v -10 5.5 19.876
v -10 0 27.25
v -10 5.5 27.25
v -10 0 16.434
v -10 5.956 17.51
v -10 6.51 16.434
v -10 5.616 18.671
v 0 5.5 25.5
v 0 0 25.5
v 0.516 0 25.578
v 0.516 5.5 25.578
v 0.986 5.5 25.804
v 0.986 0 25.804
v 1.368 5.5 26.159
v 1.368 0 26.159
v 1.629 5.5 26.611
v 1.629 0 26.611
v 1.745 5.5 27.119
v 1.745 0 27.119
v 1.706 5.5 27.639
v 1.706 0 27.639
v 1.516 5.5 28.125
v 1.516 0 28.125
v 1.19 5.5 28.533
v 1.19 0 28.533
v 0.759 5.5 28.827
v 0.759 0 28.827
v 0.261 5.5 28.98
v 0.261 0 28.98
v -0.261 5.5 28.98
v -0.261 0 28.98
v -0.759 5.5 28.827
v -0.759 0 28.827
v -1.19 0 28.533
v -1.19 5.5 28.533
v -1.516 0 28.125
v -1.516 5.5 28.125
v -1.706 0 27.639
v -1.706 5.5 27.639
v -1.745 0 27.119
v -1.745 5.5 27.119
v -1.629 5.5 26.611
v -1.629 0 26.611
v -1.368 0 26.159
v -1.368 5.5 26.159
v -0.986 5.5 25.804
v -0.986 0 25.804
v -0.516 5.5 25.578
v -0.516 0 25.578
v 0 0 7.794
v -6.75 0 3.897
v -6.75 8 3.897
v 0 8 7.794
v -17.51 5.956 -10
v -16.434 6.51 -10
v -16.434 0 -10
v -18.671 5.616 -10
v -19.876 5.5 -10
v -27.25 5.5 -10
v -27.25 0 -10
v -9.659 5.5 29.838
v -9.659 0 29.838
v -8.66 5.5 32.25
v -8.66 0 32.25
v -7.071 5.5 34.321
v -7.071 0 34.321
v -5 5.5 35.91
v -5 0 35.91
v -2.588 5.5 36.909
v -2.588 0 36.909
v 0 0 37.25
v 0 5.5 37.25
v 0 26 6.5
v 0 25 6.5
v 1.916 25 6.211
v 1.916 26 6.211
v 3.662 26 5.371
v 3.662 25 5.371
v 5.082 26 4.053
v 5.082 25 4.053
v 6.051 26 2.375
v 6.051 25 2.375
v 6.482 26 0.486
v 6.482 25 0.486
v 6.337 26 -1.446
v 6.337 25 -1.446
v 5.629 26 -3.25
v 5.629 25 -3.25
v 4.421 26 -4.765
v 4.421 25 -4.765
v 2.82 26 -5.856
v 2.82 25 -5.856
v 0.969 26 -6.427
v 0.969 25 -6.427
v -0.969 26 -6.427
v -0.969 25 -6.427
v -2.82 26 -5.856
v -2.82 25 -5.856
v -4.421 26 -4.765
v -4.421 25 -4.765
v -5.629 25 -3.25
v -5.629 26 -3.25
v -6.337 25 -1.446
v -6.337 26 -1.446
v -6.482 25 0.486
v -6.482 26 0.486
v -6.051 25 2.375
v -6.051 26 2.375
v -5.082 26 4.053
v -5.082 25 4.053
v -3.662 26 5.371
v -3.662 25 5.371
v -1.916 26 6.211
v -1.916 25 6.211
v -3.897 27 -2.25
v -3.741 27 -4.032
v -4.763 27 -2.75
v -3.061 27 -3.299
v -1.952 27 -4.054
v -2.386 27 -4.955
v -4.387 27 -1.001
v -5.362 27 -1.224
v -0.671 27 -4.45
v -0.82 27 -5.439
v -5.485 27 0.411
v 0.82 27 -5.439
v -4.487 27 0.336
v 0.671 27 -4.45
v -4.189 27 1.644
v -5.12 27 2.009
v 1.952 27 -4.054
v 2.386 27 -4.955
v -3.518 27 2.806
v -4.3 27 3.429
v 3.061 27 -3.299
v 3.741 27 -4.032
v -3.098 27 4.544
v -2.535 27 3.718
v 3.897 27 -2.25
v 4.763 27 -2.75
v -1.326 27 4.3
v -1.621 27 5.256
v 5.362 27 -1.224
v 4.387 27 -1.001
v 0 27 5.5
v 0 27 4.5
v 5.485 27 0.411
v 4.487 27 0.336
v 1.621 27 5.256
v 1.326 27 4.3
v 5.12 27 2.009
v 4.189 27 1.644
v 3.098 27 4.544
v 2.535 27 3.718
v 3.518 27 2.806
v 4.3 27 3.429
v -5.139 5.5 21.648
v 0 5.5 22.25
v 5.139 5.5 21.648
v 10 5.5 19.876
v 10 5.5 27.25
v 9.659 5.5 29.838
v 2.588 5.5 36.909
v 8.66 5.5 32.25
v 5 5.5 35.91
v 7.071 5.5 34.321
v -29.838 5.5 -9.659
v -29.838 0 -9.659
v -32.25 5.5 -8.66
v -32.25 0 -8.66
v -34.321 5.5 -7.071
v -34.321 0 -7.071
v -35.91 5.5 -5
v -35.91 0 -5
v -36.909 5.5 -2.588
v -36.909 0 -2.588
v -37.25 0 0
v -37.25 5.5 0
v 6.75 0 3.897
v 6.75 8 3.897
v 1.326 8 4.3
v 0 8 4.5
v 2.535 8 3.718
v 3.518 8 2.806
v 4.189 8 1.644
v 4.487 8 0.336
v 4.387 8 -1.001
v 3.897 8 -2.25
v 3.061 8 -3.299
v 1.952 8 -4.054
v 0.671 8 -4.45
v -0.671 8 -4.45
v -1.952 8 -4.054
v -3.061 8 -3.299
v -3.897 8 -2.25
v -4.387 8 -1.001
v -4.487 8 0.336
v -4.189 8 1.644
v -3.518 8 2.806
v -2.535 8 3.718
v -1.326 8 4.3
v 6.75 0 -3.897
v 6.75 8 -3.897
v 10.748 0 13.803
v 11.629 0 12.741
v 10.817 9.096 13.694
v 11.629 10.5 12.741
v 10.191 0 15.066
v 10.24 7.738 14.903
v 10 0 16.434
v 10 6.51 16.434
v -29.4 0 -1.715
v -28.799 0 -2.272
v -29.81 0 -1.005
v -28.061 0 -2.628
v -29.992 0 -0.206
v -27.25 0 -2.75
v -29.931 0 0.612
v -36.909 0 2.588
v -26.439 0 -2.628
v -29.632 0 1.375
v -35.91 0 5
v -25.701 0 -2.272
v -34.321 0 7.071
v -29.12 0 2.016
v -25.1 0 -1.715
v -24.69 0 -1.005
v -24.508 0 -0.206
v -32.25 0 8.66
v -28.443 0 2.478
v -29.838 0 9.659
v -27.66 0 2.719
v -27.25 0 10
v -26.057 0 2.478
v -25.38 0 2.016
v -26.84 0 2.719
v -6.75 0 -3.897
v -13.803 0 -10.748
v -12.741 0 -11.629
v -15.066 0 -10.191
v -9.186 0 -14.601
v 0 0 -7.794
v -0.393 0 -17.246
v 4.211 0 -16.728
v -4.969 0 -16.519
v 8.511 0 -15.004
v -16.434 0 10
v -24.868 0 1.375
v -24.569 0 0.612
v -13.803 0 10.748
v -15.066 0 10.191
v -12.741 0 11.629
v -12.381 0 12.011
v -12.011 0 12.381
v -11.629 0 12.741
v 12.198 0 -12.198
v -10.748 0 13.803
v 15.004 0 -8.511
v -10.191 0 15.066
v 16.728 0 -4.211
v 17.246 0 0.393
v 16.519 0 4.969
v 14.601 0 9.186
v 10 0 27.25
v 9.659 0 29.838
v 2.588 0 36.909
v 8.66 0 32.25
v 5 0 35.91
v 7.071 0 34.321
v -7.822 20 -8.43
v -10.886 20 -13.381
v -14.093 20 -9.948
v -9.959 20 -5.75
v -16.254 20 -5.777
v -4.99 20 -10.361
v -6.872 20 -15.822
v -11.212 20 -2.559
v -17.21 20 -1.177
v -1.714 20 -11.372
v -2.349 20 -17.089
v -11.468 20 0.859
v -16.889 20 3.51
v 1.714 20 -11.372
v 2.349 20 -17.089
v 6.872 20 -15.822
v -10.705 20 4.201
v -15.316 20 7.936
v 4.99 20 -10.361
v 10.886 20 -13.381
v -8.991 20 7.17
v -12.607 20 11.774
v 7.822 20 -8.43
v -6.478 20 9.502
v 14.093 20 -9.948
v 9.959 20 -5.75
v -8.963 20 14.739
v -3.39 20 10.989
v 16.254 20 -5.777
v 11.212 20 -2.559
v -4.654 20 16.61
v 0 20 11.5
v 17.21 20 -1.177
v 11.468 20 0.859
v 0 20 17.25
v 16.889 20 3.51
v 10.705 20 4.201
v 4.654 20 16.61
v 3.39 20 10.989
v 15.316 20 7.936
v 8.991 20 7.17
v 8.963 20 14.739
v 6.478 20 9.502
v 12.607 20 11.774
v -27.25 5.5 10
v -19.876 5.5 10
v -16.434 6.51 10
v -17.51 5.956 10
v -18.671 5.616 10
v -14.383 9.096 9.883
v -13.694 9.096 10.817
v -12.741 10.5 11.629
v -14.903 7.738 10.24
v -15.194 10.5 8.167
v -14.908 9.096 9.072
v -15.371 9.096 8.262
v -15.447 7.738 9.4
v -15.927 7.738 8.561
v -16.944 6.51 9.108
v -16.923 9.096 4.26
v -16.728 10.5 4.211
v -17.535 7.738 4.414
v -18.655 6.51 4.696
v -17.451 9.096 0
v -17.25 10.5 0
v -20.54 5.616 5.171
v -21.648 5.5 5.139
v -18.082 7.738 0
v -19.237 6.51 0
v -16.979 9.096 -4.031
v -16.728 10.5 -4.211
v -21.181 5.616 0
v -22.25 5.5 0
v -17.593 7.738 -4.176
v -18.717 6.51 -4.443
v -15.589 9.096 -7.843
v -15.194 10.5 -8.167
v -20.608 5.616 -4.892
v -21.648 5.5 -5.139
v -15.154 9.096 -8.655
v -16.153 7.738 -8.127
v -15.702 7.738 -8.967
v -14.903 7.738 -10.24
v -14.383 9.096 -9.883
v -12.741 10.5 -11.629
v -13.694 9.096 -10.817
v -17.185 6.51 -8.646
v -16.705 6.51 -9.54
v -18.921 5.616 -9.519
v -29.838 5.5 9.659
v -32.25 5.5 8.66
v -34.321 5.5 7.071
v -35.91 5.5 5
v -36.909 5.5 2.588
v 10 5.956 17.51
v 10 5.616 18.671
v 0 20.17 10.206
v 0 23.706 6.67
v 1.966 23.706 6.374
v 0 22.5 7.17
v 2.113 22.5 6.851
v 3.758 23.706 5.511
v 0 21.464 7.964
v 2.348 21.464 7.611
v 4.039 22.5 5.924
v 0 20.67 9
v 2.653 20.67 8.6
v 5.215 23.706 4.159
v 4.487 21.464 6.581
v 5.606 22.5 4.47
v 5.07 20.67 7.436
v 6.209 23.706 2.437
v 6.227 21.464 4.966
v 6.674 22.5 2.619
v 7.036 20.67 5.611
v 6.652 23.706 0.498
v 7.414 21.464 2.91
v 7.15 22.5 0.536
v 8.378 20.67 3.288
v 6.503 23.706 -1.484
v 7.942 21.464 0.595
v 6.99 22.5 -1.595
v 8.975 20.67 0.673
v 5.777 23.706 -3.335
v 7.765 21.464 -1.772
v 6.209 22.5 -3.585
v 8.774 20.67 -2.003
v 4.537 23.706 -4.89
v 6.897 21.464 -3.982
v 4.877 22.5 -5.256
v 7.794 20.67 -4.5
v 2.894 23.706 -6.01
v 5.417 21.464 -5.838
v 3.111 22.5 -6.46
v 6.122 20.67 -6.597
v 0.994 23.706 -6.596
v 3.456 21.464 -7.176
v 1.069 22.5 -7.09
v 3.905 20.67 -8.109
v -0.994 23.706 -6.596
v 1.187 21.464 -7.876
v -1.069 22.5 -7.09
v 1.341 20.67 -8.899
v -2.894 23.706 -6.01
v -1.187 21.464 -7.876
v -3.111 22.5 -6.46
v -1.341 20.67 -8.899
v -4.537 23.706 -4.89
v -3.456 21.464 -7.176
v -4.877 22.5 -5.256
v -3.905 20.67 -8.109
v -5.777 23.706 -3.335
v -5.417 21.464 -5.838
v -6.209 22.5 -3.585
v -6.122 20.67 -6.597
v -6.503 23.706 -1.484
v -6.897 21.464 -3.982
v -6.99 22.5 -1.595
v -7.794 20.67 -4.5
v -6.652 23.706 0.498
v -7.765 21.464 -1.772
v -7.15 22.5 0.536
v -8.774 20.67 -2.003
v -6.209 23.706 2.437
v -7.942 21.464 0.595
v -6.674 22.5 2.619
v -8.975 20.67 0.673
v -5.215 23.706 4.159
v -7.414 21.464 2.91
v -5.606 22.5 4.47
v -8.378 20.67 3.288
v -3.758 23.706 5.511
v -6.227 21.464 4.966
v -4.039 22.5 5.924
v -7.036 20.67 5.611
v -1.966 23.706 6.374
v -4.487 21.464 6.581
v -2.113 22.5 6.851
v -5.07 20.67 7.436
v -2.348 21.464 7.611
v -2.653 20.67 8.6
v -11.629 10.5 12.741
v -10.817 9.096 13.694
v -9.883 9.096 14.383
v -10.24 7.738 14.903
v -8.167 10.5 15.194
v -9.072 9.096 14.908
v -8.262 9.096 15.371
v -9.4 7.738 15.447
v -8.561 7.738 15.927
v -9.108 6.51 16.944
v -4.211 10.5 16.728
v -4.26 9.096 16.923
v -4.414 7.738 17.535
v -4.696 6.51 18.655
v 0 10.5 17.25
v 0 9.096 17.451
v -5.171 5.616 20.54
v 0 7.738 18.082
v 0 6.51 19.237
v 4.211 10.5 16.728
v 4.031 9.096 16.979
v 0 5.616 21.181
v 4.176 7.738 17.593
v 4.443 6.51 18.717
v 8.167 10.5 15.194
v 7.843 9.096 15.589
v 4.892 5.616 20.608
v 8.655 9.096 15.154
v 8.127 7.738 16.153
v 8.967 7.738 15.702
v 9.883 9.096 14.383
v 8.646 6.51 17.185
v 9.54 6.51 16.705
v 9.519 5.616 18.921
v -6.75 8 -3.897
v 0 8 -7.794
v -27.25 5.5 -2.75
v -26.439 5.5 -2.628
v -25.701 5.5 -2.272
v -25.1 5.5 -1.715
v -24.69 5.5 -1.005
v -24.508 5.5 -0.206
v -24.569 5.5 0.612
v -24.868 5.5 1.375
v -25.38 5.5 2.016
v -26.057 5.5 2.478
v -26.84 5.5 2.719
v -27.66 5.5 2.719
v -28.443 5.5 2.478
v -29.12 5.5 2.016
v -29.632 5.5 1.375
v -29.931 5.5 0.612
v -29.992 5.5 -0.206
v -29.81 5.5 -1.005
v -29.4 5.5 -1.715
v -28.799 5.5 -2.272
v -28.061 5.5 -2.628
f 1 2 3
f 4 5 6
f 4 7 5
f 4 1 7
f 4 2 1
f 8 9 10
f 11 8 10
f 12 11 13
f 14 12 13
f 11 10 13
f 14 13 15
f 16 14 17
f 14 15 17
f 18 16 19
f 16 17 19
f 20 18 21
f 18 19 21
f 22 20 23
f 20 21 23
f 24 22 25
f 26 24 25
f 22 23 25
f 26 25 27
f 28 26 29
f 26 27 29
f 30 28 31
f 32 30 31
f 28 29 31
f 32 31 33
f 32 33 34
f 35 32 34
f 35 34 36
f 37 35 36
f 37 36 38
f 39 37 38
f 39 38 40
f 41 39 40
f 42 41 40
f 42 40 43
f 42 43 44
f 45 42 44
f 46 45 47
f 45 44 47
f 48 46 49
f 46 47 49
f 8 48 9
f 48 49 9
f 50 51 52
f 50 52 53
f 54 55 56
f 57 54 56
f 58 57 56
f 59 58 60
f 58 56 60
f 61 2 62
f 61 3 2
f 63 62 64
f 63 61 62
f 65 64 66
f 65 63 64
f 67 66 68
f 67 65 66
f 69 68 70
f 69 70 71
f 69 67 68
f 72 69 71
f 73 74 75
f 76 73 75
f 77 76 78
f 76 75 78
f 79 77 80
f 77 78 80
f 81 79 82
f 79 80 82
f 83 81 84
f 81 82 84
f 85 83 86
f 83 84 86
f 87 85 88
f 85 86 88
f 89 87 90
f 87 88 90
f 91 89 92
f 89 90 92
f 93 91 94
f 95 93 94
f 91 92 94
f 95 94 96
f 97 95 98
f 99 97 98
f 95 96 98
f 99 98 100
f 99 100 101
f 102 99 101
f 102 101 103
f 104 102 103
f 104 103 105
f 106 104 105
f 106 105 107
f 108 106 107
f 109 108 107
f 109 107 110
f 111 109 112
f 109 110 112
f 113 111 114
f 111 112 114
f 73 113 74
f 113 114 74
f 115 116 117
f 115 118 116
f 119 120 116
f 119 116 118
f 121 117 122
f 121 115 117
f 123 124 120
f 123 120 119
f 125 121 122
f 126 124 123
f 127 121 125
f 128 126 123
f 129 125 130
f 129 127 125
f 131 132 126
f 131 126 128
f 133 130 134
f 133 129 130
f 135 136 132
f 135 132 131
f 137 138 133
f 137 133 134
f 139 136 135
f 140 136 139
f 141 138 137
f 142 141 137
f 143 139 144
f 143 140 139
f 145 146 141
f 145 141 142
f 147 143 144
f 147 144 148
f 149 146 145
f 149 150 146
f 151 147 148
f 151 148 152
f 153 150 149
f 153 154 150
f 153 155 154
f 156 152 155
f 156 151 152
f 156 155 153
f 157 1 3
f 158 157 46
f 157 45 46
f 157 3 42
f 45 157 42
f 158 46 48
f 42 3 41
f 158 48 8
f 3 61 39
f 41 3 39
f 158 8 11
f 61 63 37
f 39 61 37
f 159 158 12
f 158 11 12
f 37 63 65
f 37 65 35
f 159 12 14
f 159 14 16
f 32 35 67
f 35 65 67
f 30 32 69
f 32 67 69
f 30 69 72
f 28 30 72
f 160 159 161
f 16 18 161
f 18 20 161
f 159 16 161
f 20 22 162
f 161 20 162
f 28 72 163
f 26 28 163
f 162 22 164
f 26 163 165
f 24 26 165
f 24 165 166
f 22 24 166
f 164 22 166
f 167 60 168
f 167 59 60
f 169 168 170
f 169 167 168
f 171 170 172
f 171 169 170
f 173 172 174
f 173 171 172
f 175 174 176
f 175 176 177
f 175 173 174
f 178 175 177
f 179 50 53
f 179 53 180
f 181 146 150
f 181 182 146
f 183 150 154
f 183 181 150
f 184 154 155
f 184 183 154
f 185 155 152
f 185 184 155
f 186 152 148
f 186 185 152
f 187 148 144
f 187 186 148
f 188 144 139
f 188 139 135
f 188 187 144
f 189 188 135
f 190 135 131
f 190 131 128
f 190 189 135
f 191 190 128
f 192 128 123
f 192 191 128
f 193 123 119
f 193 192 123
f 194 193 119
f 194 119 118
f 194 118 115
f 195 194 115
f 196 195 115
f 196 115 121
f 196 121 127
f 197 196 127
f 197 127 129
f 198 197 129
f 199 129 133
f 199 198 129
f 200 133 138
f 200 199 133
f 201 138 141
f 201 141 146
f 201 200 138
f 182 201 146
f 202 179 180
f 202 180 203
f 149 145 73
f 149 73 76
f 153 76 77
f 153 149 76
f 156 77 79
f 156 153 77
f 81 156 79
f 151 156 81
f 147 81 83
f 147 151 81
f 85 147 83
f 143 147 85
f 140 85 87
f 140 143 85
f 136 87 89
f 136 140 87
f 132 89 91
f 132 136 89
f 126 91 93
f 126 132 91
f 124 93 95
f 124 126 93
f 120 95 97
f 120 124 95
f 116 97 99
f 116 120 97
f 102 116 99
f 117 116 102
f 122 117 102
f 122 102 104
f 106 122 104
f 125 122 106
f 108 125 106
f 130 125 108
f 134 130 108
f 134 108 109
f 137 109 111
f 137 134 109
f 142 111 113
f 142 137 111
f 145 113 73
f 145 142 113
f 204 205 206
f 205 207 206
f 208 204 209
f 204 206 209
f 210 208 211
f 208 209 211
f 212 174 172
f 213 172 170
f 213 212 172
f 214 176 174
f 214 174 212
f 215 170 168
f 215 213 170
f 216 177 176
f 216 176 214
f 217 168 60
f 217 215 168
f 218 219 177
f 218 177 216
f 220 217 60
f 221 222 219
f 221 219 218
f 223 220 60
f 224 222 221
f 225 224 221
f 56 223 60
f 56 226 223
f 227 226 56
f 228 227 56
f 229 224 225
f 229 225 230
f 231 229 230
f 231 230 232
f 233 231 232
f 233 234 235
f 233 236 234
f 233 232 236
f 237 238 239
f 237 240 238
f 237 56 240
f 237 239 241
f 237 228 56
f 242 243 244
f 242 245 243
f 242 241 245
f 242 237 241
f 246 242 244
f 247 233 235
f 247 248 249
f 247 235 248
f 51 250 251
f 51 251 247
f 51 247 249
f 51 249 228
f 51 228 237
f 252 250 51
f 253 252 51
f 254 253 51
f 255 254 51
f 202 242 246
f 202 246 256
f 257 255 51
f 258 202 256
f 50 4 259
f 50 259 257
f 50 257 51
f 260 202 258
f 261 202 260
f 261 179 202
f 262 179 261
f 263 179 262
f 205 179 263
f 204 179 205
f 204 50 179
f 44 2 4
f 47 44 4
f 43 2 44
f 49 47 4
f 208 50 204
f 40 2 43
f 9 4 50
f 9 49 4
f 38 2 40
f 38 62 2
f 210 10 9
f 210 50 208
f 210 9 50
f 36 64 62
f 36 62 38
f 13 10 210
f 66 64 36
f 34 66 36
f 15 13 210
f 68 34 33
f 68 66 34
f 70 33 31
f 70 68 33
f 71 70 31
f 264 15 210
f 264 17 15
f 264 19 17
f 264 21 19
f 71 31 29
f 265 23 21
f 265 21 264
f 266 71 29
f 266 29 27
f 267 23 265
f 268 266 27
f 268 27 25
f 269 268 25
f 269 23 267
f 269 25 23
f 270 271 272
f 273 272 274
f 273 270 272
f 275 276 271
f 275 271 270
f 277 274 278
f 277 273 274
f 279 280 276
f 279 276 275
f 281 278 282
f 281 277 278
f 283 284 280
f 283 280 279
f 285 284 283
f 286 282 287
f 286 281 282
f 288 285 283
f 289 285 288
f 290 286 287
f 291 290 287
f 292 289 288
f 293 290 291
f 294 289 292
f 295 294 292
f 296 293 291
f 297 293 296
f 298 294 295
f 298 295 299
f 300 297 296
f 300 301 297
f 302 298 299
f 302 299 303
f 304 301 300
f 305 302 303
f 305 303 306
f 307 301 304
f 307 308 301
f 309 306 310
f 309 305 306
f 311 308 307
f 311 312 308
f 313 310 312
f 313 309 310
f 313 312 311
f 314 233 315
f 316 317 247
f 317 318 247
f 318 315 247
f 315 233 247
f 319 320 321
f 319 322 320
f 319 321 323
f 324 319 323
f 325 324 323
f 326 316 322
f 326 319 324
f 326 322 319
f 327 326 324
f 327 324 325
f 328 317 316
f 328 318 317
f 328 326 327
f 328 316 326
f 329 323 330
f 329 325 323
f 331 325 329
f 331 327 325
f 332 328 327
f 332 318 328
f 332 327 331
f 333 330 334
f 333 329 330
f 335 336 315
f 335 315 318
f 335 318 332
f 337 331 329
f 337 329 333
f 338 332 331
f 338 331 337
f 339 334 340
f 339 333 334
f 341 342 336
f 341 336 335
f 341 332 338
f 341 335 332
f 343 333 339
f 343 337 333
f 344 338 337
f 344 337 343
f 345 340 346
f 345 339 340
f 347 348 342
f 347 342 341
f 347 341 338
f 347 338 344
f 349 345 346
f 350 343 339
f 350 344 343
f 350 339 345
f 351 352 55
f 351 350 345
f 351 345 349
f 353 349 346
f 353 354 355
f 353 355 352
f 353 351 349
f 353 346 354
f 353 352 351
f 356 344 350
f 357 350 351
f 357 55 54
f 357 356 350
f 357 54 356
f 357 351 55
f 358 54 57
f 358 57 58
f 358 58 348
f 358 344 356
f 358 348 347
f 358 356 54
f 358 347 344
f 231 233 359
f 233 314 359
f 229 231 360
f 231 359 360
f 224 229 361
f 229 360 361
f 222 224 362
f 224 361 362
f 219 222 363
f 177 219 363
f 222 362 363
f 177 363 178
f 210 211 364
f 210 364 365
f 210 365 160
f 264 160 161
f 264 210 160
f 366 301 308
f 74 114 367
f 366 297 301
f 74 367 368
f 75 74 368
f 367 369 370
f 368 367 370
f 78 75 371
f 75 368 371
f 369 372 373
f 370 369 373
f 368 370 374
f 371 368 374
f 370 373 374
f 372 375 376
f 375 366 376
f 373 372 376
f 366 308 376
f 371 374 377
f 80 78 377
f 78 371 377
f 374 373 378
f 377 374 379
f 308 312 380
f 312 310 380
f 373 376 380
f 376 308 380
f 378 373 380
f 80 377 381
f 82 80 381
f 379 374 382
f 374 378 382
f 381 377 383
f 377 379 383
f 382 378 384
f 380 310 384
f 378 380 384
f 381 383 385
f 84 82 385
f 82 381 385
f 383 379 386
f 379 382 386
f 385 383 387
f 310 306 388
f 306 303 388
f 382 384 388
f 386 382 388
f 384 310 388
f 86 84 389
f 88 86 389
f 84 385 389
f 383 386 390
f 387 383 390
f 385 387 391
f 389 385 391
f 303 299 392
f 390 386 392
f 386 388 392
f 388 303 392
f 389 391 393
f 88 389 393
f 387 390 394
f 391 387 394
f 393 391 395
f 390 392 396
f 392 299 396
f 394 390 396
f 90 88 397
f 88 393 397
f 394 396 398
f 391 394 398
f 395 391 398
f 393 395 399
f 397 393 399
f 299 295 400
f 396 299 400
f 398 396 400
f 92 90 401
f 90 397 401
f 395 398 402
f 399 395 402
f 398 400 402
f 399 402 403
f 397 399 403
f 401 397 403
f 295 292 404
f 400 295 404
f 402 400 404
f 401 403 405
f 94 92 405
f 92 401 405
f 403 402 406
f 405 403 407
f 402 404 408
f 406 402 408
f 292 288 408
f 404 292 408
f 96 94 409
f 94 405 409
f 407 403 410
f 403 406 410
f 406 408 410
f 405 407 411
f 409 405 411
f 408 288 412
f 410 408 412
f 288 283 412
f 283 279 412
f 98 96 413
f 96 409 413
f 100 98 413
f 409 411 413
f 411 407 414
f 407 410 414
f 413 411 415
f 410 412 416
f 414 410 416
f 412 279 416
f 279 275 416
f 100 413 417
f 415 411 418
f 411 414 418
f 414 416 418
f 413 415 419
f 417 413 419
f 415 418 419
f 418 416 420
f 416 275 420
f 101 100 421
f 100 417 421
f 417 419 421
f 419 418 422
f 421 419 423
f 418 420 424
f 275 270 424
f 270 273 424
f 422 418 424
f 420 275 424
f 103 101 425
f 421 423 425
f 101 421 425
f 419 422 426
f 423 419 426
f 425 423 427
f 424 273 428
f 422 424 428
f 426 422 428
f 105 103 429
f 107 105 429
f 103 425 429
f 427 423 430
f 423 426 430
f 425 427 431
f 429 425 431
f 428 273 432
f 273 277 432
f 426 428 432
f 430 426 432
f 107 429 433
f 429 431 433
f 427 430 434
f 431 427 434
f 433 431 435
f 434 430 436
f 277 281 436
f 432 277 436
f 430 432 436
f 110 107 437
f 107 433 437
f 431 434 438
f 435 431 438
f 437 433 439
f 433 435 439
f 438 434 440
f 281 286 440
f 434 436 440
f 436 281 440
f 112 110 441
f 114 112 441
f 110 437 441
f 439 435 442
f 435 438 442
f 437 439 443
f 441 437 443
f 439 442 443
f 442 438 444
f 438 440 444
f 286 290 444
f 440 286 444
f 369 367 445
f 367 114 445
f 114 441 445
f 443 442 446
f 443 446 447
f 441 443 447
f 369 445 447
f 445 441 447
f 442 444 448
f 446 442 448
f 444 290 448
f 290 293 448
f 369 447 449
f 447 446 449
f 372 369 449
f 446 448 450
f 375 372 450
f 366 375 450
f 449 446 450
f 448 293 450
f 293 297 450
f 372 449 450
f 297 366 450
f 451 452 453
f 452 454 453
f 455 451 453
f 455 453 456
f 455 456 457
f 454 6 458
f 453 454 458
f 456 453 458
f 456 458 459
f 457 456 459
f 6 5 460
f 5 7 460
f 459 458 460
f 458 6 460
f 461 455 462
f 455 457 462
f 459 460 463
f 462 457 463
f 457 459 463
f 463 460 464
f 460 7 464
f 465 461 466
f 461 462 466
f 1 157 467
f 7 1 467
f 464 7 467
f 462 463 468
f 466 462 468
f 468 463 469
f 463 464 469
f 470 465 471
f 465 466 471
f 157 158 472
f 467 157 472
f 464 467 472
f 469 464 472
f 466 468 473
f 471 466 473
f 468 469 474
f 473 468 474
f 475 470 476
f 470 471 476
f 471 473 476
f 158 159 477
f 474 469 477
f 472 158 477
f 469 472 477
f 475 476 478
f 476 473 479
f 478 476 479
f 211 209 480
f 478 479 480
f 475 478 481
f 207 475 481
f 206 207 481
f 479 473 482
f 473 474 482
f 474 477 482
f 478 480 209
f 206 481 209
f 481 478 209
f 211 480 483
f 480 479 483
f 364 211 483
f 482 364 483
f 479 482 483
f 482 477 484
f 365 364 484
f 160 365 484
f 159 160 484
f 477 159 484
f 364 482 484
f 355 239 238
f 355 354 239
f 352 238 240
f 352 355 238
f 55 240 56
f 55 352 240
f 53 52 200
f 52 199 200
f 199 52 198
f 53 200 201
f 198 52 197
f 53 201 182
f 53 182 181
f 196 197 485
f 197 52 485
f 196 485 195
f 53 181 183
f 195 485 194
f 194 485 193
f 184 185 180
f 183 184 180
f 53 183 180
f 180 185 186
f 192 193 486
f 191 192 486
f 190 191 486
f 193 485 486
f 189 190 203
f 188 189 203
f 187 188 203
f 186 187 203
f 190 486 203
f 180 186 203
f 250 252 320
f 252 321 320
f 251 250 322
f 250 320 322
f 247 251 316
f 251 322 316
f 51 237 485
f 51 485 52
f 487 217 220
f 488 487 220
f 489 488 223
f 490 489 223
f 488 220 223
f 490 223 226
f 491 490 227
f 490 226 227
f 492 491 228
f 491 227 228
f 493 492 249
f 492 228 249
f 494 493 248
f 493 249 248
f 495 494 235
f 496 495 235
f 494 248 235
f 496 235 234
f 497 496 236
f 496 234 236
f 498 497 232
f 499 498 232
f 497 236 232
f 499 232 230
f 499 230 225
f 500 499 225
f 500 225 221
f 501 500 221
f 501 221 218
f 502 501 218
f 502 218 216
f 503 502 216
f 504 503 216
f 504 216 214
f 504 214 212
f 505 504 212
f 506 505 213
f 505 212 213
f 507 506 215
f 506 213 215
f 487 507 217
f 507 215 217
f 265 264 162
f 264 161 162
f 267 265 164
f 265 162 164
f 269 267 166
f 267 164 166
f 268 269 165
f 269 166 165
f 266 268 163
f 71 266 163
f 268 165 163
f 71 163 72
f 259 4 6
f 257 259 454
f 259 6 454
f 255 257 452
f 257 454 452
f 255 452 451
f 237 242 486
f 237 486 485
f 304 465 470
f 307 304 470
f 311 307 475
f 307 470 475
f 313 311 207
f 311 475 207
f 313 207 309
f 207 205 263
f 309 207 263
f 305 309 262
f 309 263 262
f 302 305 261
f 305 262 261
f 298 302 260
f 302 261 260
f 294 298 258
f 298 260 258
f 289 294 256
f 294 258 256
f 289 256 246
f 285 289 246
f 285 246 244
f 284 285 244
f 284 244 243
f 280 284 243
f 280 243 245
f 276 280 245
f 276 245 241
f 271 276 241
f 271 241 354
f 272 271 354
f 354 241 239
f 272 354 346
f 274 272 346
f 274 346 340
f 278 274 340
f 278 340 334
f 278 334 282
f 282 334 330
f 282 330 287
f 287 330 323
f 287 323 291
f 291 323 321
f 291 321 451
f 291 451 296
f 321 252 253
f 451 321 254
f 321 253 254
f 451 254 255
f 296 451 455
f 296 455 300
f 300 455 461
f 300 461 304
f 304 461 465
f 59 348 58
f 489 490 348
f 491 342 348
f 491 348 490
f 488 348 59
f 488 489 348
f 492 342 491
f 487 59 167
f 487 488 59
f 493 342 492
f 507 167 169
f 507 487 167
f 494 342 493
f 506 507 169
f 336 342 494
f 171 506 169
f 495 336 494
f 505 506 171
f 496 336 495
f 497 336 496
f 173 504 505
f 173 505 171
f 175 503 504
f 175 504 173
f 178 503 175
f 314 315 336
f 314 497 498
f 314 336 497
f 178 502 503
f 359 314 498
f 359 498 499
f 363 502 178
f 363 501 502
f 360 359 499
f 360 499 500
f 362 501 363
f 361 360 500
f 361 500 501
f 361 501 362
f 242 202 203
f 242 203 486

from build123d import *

# Parameters (mm, degrees)
ESBO_O1_R                = 17.25
ESBO_O1_R_2              = 4.5
RESSALTO_EXTRUS_O1_DEPTH = 20
CORTE_EXTRUS_O1_DEPTH    = 8
ESBO_O5_R                = 2.75
ESBO_O5_R_2              = 1.75
RESSALTO_EXTRUS_O2_DEPTH = 5.5
FILETE1_R                = 5
FILETE2_R                = 10
ESBO_O7_R                = 6.5
ESBO_O7_R_2              = 4.5
RESSALTO_EXTRUS_O3_DEPTH = 7
FILETE3_R                = 5
CHANFRO1_SIZE            = 1


with BuildPart() as part:
    # Esboço1 → Ressalto-extrusão1 (new body)
    with BuildSketch(Plane(origin=(0, 0, 0), x_dir=(1, 0, 0), z_dir=(0, 1, 0))):
        with Locations(Location((0, 0, 0), (0, 0, 270))):
            Circle(ESBO_O1_R)
        with Locations(Location((0, 0, 0), (0, 0, 270))):
            Circle(ESBO_O1_R_2, mode=Mode.SUBTRACT)
    extrude(amount=RESSALTO_EXTRUS_O1_DEPTH)

    # Esboço1<3> → Corte-extrusão1 (cut)
    with BuildSketch(Plane(origin=(0, 0, 0), x_dir=(1, 0, 0), z_dir=(0, 1, 0))):
        Polygon((-6.75, 3.897114317), (-6.75, -3.897114317), (0, -7.794228634), (6.75, -3.897114317), (6.75, 3.897114317), (0, 7.794228634), align=None)
    extrude(amount=CORTE_EXTRUS_O1_DEPTH, mode=Mode.SUBTRACT)

    # Esboço5 → Ressalto-extrusão2 (add)
    # profile 1 of 2: a face of its own
    with BuildSketch(Plane.XZ):
        with BuildLine():
            Line((-17.25, 10), (-14.055692797, 10))
            ThreePointArc((-14.055692797, 10), (-17.25, 0), (-14.055692797, -10))
            Line((-14.055692797, -10), (-17.25, -10))
            Line((-17.25, -10), (-37.25, -10))
            Line((-37.25, -10), (-37.25, 10))
            Line((-37.25, 10), (-17.25, 10))
        make_face()
        with Locations(Location((-27.25, 0, 0), (0, 0, 270))):
            Circle(ESBO_O5_R, mode=Mode.SUBTRACT)
    # profile 2 of 2: a face of its own
    with BuildSketch(Plane.XZ):
        with BuildLine():
            Line((-10, 17.25), (-10, 14.055692797))
            ThreePointArc((-10, 14.055692797), (0, 17.25), (10, 14.055692797))
            Line((10, 14.055692797), (10, 17.25))
            Line((10, 17.25), (10, 37.25))
            Line((10, 37.25), (-10, 37.25))
            Line((-10, 37.25), (-10, 17.25))
        make_face()
        with Locations(Location((0, 27.25, 0), (0, 0, 270))):
            Circle(ESBO_O5_R_2, mode=Mode.SUBTRACT)
    extrude(amount=-RESSALTO_EXTRUS_O2_DEPTH)

    # Filete1
    filete1_edges = [part.edges().sort_by_distance(p)[0] for p in [
        (-14.055692797, 2.75, -10),
        (-17.25, 5.5, 0),
        (-14.055692797, 2.75, 10),
        (-5.248895086, 5.5, 16.432029709),
        (10, 2.75, 14.055692797),
        (-10, 2.75, 14.055692797),
    ]]
    fillet(filete1_edges, radius=FILETE1_R)

    # Filete2
    filete2_edges = [part.edges().sort_by_distance(p)[0] for p in [
        (10, 2.75, 37.25),
        (-10, 2.75, 37.25),
        (-37.25, 2.75, -10),
        (-37.25, 2.75, 10),
    ]]
    fillet(filete2_edges, radius=FILETE2_R - 0.0001)  # a hair under: the kernel refuses the full size

    # Esboço7 → Ressalto-extrusão3 (add)
    with BuildSketch(Plane(origin=(0, 20, 0), x_dir=(1, 0, 0), z_dir=(0, 1, 0))):
        with Locations(Location((0, 0, 0), (0, 0, 270))):
            Circle(ESBO_O7_R)
        with Locations(Location((0, 0, 0), (0, 0, 270))):
            Circle(ESBO_O7_R_2, mode=Mode.SUBTRACT)
    extrude(amount=RESSALTO_EXTRUS_O3_DEPTH)

    # Filete3
    filete3_edges = [part.edges().sort_by_distance(p)[0] for p in [
        (0, 20, -6.5),
    ]]
    fillet(filete3_edges, radius=FILETE3_R)

    # Chanfro1
    chanfro1_edges = [part.edges().sort_by_distance(p)[0] for p in [
        (0, 27, -6.5),
    ]]
    chamfer(chanfro1_edges, length=CHANFRO1_SIZE)


solid = part.part
